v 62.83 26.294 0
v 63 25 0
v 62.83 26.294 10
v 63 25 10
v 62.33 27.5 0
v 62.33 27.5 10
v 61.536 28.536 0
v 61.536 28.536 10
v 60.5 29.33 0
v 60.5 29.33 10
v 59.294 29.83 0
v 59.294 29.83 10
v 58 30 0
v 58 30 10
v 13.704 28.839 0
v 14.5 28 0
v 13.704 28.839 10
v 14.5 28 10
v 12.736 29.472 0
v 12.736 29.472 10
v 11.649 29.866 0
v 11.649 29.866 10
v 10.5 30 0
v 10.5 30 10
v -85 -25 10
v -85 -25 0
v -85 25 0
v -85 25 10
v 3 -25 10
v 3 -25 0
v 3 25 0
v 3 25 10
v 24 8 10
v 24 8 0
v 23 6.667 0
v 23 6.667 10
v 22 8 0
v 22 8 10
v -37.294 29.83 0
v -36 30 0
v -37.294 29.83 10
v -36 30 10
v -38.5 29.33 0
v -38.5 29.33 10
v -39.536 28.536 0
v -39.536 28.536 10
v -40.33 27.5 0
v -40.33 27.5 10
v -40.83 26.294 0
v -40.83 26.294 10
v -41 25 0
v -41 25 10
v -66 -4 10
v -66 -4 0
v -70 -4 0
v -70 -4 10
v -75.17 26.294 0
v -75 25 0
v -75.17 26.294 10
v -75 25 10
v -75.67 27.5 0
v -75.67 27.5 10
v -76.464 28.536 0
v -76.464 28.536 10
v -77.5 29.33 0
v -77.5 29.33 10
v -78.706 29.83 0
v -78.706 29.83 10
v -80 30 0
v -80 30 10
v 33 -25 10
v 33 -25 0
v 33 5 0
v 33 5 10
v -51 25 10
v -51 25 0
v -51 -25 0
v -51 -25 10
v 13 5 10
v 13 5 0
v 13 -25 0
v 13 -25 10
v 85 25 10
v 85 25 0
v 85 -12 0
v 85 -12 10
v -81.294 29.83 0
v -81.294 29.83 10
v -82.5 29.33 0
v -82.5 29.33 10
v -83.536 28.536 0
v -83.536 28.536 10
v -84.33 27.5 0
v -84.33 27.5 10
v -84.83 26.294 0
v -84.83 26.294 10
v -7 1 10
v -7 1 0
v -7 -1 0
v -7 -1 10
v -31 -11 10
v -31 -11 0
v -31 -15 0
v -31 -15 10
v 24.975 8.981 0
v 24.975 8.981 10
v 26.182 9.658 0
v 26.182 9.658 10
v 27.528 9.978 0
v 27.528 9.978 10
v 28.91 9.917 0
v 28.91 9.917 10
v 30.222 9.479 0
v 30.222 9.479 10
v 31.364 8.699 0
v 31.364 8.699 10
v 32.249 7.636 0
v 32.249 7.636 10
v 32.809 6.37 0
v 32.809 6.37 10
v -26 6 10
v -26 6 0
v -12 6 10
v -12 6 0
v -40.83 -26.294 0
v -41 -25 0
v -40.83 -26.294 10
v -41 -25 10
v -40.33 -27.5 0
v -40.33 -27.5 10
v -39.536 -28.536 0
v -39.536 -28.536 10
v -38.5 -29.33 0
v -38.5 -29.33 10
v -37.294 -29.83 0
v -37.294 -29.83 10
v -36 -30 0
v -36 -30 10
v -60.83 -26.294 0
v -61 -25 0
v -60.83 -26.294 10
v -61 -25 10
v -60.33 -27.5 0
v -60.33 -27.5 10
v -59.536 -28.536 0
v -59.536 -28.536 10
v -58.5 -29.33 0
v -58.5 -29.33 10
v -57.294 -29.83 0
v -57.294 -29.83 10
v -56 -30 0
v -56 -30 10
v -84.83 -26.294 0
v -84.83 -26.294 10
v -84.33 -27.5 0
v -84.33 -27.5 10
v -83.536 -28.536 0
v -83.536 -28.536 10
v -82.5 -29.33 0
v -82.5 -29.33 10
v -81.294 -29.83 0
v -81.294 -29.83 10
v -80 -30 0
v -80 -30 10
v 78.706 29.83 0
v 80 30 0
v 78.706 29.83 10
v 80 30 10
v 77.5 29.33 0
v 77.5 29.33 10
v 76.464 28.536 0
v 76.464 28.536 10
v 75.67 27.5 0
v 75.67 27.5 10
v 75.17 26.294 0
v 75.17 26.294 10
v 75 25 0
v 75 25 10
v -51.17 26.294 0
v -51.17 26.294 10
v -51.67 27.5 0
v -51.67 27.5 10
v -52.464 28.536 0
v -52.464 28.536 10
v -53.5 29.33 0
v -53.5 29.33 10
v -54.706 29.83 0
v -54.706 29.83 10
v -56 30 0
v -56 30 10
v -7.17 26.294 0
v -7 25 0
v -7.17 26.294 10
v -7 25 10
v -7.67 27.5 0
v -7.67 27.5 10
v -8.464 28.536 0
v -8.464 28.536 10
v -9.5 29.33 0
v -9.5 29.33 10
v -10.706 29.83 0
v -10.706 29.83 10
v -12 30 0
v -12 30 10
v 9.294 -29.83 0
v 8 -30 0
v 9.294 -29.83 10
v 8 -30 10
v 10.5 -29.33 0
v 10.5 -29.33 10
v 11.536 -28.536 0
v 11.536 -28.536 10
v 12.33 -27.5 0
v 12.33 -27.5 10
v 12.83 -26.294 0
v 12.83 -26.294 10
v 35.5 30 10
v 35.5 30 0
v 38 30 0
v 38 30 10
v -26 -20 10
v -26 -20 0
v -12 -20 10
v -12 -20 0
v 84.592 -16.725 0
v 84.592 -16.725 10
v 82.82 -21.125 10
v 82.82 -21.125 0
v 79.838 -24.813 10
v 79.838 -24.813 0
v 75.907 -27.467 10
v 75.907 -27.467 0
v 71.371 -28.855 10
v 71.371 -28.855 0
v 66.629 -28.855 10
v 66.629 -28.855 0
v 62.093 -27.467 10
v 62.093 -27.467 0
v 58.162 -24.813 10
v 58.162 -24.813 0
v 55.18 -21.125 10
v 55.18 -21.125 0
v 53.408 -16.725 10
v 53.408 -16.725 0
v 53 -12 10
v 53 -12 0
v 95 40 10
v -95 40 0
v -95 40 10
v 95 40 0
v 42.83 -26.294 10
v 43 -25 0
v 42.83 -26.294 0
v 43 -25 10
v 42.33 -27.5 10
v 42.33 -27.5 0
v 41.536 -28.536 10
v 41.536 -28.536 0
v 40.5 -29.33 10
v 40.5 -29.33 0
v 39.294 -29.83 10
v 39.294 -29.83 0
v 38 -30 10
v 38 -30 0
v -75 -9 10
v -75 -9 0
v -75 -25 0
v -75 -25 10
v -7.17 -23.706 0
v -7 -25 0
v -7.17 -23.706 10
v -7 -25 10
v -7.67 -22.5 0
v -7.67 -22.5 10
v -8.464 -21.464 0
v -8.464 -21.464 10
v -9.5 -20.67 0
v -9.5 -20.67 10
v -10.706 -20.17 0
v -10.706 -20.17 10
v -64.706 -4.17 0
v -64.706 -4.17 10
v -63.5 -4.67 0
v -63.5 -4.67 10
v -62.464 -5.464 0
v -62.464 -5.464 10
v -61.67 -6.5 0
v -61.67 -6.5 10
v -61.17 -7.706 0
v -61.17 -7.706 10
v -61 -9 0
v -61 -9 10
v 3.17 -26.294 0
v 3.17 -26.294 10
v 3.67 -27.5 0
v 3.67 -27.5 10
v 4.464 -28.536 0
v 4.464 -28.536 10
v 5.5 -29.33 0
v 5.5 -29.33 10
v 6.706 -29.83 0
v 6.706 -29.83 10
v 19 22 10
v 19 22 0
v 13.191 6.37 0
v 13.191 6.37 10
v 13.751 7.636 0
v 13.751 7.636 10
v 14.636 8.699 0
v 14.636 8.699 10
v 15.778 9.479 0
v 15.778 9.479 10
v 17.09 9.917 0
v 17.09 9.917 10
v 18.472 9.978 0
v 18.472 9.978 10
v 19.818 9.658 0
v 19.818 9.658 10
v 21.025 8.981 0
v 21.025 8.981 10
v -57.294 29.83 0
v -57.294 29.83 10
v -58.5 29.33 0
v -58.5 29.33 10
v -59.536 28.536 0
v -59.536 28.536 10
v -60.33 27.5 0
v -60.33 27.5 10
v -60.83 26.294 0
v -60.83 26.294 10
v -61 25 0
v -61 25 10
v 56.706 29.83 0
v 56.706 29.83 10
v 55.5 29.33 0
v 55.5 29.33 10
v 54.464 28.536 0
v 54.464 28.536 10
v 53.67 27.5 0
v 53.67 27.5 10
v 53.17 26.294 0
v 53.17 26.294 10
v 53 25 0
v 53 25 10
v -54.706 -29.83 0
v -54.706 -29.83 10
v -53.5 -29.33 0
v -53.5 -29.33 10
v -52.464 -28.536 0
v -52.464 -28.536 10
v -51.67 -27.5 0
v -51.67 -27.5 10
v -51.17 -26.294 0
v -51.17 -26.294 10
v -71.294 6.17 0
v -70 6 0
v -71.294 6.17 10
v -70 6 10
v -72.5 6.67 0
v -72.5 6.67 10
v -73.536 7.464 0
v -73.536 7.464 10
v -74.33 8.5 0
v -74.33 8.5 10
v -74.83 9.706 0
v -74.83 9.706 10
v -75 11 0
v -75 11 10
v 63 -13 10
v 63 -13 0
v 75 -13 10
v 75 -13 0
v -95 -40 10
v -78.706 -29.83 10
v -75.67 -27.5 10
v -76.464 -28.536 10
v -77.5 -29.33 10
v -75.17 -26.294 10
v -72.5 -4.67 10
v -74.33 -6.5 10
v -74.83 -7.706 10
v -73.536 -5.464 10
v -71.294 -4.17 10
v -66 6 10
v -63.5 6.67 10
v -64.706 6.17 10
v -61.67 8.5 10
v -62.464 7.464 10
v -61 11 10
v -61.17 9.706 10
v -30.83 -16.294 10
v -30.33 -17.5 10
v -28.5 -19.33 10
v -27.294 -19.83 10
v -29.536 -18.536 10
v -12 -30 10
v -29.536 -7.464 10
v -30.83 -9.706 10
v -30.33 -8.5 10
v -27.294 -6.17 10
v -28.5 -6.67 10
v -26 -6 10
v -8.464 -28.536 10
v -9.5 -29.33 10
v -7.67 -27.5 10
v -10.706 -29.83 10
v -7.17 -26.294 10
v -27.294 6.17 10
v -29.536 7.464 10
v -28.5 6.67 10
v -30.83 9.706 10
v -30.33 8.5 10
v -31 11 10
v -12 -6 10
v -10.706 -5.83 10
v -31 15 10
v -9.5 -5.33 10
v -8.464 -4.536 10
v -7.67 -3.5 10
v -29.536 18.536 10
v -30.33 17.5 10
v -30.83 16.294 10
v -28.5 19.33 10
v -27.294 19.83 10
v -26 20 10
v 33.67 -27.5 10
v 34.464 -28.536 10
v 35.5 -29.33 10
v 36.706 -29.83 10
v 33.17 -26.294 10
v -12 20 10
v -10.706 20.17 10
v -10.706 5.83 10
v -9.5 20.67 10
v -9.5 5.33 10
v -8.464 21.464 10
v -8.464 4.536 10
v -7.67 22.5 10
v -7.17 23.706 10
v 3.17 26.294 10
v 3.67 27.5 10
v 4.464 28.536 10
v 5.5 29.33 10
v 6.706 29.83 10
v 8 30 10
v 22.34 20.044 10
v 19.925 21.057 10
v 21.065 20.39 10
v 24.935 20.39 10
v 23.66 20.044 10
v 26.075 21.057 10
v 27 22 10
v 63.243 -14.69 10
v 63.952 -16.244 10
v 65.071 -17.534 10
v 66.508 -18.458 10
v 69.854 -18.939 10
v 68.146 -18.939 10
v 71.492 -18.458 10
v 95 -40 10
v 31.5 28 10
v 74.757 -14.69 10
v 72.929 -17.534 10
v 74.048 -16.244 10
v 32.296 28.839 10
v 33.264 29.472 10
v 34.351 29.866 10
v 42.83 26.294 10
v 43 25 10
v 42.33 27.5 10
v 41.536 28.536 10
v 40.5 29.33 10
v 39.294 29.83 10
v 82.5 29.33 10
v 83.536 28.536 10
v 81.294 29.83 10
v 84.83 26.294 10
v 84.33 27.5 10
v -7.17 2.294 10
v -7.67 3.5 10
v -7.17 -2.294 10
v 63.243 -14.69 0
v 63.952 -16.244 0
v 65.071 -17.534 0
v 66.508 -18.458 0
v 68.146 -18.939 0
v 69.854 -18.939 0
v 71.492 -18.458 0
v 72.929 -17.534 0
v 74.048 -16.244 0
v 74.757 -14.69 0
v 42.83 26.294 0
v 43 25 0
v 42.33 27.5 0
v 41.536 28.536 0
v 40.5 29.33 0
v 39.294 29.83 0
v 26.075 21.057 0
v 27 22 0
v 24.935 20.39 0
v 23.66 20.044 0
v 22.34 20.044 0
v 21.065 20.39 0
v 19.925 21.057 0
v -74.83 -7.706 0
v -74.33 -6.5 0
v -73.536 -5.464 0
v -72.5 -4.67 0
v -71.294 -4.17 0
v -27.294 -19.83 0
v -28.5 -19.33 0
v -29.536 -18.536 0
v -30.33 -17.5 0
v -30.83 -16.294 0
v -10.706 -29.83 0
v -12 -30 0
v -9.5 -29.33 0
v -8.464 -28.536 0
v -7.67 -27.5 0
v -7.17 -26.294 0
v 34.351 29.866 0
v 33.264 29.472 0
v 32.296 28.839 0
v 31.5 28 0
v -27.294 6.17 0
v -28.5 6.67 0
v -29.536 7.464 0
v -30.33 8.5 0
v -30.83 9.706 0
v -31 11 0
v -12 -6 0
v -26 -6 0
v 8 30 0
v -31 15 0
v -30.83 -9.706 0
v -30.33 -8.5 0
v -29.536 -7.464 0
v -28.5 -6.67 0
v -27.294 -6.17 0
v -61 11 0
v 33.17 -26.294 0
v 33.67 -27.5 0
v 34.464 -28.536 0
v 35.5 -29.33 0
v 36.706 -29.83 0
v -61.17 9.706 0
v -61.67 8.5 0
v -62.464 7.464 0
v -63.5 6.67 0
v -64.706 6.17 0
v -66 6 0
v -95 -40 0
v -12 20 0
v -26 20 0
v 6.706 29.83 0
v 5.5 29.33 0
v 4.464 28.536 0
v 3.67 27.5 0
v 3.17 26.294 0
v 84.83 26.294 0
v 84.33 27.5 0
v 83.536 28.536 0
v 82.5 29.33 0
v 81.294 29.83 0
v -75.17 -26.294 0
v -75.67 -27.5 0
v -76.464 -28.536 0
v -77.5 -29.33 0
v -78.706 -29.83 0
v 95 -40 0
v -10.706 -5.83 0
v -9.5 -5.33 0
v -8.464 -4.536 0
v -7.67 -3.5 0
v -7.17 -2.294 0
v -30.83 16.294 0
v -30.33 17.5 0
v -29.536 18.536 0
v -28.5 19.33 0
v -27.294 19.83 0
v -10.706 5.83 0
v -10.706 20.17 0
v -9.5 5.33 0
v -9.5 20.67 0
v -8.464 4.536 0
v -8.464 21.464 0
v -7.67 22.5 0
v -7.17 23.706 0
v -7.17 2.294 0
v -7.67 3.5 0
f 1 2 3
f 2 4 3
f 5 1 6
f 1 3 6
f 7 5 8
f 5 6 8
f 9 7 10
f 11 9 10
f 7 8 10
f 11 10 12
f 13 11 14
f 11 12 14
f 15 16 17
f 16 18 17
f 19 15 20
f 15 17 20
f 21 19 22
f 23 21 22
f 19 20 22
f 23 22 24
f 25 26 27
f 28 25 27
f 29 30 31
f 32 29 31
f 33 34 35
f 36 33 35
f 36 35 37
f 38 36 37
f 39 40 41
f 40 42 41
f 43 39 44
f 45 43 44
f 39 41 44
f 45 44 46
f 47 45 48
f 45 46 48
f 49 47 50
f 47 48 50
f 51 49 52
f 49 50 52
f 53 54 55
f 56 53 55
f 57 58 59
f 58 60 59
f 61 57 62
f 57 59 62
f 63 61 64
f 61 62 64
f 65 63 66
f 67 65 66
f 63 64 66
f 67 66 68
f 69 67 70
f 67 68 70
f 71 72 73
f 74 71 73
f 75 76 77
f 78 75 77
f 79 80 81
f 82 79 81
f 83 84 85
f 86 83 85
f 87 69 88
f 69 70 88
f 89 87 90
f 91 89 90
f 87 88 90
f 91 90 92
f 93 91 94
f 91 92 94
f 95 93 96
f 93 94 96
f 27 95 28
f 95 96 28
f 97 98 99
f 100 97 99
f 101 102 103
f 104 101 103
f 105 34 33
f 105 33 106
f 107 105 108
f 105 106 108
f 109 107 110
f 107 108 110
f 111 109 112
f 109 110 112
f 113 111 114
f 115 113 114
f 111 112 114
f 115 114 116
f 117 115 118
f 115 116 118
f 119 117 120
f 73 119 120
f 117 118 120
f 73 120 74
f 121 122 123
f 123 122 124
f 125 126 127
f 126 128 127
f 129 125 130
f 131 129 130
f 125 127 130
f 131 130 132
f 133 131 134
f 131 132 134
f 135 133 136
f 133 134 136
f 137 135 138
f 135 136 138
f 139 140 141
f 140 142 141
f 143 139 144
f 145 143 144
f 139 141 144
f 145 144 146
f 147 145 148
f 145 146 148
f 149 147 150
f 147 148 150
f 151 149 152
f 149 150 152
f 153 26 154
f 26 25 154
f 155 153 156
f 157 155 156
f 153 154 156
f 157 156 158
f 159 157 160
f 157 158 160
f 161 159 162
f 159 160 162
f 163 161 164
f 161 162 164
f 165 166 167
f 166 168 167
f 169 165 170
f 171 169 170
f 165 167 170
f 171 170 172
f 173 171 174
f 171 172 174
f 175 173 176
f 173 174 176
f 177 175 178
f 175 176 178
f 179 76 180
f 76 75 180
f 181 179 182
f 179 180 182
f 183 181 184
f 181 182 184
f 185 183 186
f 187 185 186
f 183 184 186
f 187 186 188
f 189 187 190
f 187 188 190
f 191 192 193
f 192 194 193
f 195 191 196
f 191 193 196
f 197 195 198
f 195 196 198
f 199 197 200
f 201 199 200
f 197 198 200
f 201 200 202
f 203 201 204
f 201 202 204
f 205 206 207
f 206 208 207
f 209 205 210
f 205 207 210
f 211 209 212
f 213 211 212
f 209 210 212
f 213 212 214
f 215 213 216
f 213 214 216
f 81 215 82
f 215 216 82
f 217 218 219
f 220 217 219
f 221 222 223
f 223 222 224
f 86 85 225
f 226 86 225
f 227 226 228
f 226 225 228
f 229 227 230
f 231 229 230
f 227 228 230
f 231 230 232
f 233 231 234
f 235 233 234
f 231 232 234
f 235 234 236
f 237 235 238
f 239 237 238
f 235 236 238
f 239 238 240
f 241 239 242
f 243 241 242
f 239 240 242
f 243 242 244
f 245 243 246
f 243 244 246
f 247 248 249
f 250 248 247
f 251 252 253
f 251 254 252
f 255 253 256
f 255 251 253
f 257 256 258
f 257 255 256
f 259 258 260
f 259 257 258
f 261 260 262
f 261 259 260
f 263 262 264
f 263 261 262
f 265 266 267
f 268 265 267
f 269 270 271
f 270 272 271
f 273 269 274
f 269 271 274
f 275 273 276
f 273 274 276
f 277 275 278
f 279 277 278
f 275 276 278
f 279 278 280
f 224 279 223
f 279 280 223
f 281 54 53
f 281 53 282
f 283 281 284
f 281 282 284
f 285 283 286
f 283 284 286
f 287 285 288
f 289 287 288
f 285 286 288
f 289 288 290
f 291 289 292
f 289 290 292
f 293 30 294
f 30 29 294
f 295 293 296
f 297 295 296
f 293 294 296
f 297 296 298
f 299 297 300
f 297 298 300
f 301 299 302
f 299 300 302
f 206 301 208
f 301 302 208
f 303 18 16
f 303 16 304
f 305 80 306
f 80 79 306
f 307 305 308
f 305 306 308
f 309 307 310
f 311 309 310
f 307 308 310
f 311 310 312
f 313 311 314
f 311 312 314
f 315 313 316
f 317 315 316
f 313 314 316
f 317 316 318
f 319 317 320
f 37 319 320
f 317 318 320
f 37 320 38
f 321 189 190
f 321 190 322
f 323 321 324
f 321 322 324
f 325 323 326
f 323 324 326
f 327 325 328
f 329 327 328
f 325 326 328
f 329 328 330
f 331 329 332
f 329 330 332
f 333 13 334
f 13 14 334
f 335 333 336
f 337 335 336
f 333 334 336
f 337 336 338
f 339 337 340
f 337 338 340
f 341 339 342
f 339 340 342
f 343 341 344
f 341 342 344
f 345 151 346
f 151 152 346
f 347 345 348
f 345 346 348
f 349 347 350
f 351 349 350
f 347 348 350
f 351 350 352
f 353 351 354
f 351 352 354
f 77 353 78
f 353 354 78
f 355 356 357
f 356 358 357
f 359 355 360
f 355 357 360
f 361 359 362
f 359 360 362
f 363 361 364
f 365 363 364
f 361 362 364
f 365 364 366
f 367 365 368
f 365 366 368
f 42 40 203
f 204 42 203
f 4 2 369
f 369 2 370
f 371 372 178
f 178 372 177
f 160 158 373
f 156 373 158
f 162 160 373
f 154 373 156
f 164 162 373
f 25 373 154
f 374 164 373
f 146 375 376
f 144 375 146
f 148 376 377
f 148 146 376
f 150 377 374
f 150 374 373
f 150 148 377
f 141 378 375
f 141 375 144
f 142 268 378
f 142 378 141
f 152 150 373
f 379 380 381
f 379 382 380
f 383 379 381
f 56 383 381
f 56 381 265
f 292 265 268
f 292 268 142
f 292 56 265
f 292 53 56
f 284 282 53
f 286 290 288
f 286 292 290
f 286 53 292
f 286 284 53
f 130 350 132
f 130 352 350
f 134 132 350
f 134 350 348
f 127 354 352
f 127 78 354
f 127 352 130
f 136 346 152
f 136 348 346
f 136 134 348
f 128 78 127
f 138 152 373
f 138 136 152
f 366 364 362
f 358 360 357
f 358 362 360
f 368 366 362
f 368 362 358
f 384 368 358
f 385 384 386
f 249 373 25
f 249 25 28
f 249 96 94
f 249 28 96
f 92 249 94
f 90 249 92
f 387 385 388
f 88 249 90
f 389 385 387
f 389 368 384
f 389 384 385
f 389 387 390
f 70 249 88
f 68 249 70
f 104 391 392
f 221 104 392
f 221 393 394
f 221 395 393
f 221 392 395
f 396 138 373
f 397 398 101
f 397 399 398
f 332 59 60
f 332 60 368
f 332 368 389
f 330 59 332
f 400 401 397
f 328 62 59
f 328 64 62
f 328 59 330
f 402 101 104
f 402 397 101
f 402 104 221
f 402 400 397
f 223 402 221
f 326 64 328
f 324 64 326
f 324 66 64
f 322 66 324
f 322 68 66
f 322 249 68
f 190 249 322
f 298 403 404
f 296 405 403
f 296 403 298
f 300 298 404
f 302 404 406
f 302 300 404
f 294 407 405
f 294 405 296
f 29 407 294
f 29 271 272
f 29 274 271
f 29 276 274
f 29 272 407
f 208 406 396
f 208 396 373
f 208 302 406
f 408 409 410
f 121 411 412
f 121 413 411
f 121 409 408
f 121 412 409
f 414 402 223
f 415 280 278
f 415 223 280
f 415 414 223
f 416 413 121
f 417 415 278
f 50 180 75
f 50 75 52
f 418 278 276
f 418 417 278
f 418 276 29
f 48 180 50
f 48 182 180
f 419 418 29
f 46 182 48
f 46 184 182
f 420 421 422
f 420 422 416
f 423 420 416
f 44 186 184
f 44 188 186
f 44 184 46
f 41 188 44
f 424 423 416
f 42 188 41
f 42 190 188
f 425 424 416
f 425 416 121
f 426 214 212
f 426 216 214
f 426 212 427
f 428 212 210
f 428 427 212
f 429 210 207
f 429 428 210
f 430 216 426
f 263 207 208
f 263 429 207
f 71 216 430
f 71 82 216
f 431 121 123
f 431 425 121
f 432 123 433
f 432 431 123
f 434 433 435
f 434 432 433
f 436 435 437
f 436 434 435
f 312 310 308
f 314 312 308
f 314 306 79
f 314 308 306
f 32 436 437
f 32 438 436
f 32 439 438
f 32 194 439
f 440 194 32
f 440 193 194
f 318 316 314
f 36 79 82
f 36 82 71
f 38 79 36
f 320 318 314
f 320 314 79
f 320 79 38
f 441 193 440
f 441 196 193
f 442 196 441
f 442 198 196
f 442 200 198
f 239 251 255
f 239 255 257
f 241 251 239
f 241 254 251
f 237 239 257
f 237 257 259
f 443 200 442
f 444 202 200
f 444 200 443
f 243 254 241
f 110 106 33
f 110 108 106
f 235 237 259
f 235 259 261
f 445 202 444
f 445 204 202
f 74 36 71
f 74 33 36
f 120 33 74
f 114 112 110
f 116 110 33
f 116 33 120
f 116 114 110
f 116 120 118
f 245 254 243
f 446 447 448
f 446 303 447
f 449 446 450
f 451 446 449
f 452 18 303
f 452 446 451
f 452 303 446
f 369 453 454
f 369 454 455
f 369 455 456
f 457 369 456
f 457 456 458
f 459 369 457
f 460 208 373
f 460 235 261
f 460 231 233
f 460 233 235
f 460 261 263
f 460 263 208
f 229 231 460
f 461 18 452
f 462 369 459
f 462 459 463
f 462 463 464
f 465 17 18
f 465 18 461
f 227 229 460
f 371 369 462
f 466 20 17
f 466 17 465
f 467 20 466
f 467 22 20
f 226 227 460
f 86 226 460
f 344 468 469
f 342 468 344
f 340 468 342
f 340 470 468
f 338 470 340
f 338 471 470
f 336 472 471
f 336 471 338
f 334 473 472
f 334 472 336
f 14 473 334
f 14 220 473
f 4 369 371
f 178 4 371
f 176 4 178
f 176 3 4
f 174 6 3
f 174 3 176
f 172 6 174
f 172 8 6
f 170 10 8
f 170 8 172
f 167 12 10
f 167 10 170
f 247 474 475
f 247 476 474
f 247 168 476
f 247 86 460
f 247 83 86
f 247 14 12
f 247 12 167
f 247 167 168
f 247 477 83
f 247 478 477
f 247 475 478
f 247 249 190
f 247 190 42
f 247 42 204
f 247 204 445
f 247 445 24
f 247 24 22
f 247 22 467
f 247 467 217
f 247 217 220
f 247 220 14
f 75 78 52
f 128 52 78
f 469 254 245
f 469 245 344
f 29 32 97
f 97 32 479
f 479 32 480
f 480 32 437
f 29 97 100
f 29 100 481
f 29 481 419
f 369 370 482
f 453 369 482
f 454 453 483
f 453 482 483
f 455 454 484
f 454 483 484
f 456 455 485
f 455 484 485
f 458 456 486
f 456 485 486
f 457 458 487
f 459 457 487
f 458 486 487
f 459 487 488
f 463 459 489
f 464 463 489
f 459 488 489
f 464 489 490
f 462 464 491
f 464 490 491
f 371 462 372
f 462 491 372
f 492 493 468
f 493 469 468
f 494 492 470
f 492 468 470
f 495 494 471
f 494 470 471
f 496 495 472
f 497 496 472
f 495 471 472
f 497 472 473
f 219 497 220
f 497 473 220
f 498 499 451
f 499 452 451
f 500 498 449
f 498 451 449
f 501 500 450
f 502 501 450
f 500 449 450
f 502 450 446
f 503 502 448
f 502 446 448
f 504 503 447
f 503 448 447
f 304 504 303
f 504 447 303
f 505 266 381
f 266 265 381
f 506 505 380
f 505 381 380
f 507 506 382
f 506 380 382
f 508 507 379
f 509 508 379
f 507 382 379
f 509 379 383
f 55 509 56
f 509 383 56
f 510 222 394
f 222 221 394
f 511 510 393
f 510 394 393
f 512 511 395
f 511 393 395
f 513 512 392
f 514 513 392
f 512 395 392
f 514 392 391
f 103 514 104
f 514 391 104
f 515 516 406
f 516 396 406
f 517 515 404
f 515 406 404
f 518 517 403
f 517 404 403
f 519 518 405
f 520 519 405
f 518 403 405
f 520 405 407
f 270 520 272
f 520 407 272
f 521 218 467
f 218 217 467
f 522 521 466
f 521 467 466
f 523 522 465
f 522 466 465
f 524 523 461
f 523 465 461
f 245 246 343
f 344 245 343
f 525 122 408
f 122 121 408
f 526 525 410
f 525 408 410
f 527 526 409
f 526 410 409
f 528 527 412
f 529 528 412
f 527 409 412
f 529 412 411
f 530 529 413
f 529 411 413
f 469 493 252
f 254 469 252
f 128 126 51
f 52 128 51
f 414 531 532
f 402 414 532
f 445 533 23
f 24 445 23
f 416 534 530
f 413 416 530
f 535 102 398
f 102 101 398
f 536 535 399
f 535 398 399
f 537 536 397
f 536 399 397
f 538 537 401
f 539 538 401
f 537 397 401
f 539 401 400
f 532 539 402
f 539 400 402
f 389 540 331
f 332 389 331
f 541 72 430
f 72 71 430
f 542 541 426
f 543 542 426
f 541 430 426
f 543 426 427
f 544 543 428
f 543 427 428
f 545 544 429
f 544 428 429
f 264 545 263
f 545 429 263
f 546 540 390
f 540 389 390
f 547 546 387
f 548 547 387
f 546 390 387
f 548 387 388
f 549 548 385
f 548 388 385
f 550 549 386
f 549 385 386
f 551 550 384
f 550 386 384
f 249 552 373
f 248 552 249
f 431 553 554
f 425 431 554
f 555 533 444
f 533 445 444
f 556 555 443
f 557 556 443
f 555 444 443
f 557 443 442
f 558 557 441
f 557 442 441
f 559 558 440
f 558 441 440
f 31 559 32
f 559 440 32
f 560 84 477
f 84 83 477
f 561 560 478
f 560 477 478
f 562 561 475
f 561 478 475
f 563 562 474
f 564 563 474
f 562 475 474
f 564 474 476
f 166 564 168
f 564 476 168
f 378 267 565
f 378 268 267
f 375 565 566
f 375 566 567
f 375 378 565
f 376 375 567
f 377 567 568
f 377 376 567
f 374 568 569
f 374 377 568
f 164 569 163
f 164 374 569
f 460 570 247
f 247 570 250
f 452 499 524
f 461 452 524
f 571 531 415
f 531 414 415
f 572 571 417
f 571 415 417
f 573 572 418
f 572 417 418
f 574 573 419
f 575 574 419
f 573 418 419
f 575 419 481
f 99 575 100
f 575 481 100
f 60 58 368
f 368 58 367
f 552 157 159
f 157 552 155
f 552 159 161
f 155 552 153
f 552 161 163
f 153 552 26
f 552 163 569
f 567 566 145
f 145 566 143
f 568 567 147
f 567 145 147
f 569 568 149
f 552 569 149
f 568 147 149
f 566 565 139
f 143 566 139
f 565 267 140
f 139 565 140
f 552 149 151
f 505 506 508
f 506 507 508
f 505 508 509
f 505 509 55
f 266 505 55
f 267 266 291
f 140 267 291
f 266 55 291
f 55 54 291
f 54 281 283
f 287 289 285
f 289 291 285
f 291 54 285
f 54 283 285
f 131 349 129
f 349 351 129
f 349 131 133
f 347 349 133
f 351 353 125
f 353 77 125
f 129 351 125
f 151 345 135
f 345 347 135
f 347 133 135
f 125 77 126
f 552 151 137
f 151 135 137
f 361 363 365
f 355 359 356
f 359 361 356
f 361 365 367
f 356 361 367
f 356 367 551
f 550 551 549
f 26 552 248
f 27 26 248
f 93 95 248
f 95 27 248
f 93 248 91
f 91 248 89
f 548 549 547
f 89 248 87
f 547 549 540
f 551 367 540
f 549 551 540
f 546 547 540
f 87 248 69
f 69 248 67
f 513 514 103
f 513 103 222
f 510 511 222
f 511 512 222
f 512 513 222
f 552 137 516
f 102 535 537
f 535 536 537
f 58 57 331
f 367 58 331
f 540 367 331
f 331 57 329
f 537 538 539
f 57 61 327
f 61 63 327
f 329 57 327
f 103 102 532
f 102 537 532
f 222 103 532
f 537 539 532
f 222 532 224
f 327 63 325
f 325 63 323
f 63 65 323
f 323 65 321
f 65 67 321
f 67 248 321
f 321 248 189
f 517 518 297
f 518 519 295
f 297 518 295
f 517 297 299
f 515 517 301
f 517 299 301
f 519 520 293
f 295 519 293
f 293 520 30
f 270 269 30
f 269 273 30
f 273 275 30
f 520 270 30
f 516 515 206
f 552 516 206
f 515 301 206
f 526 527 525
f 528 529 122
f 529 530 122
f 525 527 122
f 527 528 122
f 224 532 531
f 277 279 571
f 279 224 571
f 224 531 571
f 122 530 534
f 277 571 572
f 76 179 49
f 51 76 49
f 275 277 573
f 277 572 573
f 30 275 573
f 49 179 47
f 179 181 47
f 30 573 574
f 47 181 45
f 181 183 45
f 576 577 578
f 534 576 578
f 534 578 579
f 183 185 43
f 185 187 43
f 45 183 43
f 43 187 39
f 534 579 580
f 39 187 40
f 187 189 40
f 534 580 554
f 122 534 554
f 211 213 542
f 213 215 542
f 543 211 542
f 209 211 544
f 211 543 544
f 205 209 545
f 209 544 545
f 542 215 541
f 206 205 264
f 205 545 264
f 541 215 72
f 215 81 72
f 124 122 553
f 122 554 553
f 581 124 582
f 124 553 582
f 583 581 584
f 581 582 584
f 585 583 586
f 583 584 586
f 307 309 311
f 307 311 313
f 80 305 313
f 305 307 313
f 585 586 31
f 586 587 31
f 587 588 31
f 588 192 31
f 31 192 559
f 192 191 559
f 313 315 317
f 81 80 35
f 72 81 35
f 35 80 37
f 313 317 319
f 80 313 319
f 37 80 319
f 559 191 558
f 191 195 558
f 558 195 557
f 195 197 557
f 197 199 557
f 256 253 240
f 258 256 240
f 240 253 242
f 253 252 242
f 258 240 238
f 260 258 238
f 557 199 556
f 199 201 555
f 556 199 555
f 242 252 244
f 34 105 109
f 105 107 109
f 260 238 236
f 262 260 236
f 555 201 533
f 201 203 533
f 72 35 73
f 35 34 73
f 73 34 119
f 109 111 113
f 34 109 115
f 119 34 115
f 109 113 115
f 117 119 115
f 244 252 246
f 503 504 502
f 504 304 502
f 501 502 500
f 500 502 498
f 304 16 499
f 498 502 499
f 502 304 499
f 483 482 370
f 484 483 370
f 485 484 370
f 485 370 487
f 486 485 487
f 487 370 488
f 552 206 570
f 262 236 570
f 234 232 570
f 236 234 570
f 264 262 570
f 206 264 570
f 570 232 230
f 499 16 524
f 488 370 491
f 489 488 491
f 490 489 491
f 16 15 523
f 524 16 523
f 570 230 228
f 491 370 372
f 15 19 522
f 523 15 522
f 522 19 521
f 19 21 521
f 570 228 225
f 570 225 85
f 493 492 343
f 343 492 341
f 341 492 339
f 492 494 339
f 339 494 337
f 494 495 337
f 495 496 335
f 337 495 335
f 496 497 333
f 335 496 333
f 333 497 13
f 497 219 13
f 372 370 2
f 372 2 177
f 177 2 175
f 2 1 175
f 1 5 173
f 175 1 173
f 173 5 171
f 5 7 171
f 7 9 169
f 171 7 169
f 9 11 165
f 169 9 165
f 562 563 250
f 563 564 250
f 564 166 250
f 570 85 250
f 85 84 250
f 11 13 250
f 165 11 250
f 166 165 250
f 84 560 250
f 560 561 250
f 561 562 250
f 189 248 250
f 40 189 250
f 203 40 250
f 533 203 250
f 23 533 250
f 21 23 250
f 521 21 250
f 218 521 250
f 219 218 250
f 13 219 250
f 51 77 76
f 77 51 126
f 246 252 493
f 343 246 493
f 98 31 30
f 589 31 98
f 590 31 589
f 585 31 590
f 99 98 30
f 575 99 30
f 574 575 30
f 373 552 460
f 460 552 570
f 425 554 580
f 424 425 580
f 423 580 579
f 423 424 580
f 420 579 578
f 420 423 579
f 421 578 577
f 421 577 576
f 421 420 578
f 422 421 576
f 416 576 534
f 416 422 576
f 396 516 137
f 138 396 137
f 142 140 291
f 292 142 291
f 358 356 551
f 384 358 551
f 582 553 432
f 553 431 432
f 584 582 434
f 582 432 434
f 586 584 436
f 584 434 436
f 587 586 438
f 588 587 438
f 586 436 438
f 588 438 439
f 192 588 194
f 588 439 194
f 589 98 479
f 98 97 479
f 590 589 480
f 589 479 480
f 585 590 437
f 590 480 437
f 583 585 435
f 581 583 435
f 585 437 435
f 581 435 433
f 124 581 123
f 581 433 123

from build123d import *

# Parameters (mm, degrees)
SKETCH1_W           = 190
SKETCH1_H           = 80
BOSS_EXTRUDE1_DEPTH = 10
CUT_EXTRUDE1_DEPTH  = 10
FILLET1_R           = 5


with BuildPart() as part:
    # Sketch1 → Boss-Extrude1 (new body)
    with BuildSketch(Plane.XY):
        Rectangle(SKETCH1_W, SKETCH1_H)
    extrude(amount=BOSS_EXTRUDE1_DEPTH)

    # Sketch2 → Cut-Extrude1 (cut)
    with BuildSketch(Plane.XY):
        Polygon((-75, -30), (-85, -30), (-85, 30), (-75, 30), (-75, 6), (-61, 6), (-61, 30), (-51, 30), (-51, -30), (-61, -30), (-61, -4), (-75, -4), align=None)
        Polygon((-31, 20), (-31, 6), (-7, 6), (-7, -6), (-31, -6), (-31, -20), (-7, -20), (-7, -30), (-41, -30), (-41, 30), (-7, 30), (-7, 20), align=None)
        Polygon((43, -30), (33, -30), (33, 20), (23, 6.666666667), (13, 20), (13, -30), (3, -30), (3, 30), (13, 30), (23, 16.666666667), (33, 30), (43, 30), align=None)
        with BuildLine():
            Line((53, -12), (53, 30))
            Line((53, 30), (63, 30))
            Line((63, 30), (63, -13))
            ThreePointArc((63, -13), (69, -19), (75, -13))
            Line((75, -13), (75, 30))
            Line((75, 30), (85, 30))
            Line((85, 30), (85, -12))
            ThreePointArc((85, -12), (69, -29.031219542), (53, -12))
        make_face()
    extrude(amount=CUT_EXTRUDE1_DEPTH, mode=Mode.SUBTRACT)

    # Fillet1
    fillet1_edges = [part.edges().sort_by_distance(p)[0] for p in [
        (63, 30, 5),
        (53, 30, 5),
        (85, 30, 5),
        (75, 30, 5),
        (-85, -30, 5),
        (-75, -30, 5),
        (-75, -4, 5),
        (-61, -4, 5),
        (-61, -30, 5),
        (-51, -30, 5),
        (-51, 30, 5),
        (-61, 30, 5),
        (-61, 6, 5),
        (-75, 6, 5),
        (-75, 30, 5),
        (-85, 30, 5),
        (-31, 20, 5),
        (-7, 20, 5),
        (-7, 30, 5),
        (-41, 30, 5),
        (-41, -30, 5),
        (-7, -30, 5),
        (-7, -20, 5),
        (-31, -20, 5),
        (-31, -6, 5),
        (-7, -6, 5),
        (-7, 6, 5),
        (-31, 6, 5),
        (13, 20, 5),
        (33, 20, 5),
        (33, -30, 5),
        (43, -30, 5),
        (43, 30, 5),
        (33, 30, 5),
        (23, 16.666666667, 5),
        (13, 30, 5),
        (3, 30, 5),
        (3, -30, 5),
        (13, -30, 5),
    ]]
    fillet(fillet1_edges, radius=FILLET1_R - 0.0001)  # a hair under: the kernel refuses the full size


solid = part.part
